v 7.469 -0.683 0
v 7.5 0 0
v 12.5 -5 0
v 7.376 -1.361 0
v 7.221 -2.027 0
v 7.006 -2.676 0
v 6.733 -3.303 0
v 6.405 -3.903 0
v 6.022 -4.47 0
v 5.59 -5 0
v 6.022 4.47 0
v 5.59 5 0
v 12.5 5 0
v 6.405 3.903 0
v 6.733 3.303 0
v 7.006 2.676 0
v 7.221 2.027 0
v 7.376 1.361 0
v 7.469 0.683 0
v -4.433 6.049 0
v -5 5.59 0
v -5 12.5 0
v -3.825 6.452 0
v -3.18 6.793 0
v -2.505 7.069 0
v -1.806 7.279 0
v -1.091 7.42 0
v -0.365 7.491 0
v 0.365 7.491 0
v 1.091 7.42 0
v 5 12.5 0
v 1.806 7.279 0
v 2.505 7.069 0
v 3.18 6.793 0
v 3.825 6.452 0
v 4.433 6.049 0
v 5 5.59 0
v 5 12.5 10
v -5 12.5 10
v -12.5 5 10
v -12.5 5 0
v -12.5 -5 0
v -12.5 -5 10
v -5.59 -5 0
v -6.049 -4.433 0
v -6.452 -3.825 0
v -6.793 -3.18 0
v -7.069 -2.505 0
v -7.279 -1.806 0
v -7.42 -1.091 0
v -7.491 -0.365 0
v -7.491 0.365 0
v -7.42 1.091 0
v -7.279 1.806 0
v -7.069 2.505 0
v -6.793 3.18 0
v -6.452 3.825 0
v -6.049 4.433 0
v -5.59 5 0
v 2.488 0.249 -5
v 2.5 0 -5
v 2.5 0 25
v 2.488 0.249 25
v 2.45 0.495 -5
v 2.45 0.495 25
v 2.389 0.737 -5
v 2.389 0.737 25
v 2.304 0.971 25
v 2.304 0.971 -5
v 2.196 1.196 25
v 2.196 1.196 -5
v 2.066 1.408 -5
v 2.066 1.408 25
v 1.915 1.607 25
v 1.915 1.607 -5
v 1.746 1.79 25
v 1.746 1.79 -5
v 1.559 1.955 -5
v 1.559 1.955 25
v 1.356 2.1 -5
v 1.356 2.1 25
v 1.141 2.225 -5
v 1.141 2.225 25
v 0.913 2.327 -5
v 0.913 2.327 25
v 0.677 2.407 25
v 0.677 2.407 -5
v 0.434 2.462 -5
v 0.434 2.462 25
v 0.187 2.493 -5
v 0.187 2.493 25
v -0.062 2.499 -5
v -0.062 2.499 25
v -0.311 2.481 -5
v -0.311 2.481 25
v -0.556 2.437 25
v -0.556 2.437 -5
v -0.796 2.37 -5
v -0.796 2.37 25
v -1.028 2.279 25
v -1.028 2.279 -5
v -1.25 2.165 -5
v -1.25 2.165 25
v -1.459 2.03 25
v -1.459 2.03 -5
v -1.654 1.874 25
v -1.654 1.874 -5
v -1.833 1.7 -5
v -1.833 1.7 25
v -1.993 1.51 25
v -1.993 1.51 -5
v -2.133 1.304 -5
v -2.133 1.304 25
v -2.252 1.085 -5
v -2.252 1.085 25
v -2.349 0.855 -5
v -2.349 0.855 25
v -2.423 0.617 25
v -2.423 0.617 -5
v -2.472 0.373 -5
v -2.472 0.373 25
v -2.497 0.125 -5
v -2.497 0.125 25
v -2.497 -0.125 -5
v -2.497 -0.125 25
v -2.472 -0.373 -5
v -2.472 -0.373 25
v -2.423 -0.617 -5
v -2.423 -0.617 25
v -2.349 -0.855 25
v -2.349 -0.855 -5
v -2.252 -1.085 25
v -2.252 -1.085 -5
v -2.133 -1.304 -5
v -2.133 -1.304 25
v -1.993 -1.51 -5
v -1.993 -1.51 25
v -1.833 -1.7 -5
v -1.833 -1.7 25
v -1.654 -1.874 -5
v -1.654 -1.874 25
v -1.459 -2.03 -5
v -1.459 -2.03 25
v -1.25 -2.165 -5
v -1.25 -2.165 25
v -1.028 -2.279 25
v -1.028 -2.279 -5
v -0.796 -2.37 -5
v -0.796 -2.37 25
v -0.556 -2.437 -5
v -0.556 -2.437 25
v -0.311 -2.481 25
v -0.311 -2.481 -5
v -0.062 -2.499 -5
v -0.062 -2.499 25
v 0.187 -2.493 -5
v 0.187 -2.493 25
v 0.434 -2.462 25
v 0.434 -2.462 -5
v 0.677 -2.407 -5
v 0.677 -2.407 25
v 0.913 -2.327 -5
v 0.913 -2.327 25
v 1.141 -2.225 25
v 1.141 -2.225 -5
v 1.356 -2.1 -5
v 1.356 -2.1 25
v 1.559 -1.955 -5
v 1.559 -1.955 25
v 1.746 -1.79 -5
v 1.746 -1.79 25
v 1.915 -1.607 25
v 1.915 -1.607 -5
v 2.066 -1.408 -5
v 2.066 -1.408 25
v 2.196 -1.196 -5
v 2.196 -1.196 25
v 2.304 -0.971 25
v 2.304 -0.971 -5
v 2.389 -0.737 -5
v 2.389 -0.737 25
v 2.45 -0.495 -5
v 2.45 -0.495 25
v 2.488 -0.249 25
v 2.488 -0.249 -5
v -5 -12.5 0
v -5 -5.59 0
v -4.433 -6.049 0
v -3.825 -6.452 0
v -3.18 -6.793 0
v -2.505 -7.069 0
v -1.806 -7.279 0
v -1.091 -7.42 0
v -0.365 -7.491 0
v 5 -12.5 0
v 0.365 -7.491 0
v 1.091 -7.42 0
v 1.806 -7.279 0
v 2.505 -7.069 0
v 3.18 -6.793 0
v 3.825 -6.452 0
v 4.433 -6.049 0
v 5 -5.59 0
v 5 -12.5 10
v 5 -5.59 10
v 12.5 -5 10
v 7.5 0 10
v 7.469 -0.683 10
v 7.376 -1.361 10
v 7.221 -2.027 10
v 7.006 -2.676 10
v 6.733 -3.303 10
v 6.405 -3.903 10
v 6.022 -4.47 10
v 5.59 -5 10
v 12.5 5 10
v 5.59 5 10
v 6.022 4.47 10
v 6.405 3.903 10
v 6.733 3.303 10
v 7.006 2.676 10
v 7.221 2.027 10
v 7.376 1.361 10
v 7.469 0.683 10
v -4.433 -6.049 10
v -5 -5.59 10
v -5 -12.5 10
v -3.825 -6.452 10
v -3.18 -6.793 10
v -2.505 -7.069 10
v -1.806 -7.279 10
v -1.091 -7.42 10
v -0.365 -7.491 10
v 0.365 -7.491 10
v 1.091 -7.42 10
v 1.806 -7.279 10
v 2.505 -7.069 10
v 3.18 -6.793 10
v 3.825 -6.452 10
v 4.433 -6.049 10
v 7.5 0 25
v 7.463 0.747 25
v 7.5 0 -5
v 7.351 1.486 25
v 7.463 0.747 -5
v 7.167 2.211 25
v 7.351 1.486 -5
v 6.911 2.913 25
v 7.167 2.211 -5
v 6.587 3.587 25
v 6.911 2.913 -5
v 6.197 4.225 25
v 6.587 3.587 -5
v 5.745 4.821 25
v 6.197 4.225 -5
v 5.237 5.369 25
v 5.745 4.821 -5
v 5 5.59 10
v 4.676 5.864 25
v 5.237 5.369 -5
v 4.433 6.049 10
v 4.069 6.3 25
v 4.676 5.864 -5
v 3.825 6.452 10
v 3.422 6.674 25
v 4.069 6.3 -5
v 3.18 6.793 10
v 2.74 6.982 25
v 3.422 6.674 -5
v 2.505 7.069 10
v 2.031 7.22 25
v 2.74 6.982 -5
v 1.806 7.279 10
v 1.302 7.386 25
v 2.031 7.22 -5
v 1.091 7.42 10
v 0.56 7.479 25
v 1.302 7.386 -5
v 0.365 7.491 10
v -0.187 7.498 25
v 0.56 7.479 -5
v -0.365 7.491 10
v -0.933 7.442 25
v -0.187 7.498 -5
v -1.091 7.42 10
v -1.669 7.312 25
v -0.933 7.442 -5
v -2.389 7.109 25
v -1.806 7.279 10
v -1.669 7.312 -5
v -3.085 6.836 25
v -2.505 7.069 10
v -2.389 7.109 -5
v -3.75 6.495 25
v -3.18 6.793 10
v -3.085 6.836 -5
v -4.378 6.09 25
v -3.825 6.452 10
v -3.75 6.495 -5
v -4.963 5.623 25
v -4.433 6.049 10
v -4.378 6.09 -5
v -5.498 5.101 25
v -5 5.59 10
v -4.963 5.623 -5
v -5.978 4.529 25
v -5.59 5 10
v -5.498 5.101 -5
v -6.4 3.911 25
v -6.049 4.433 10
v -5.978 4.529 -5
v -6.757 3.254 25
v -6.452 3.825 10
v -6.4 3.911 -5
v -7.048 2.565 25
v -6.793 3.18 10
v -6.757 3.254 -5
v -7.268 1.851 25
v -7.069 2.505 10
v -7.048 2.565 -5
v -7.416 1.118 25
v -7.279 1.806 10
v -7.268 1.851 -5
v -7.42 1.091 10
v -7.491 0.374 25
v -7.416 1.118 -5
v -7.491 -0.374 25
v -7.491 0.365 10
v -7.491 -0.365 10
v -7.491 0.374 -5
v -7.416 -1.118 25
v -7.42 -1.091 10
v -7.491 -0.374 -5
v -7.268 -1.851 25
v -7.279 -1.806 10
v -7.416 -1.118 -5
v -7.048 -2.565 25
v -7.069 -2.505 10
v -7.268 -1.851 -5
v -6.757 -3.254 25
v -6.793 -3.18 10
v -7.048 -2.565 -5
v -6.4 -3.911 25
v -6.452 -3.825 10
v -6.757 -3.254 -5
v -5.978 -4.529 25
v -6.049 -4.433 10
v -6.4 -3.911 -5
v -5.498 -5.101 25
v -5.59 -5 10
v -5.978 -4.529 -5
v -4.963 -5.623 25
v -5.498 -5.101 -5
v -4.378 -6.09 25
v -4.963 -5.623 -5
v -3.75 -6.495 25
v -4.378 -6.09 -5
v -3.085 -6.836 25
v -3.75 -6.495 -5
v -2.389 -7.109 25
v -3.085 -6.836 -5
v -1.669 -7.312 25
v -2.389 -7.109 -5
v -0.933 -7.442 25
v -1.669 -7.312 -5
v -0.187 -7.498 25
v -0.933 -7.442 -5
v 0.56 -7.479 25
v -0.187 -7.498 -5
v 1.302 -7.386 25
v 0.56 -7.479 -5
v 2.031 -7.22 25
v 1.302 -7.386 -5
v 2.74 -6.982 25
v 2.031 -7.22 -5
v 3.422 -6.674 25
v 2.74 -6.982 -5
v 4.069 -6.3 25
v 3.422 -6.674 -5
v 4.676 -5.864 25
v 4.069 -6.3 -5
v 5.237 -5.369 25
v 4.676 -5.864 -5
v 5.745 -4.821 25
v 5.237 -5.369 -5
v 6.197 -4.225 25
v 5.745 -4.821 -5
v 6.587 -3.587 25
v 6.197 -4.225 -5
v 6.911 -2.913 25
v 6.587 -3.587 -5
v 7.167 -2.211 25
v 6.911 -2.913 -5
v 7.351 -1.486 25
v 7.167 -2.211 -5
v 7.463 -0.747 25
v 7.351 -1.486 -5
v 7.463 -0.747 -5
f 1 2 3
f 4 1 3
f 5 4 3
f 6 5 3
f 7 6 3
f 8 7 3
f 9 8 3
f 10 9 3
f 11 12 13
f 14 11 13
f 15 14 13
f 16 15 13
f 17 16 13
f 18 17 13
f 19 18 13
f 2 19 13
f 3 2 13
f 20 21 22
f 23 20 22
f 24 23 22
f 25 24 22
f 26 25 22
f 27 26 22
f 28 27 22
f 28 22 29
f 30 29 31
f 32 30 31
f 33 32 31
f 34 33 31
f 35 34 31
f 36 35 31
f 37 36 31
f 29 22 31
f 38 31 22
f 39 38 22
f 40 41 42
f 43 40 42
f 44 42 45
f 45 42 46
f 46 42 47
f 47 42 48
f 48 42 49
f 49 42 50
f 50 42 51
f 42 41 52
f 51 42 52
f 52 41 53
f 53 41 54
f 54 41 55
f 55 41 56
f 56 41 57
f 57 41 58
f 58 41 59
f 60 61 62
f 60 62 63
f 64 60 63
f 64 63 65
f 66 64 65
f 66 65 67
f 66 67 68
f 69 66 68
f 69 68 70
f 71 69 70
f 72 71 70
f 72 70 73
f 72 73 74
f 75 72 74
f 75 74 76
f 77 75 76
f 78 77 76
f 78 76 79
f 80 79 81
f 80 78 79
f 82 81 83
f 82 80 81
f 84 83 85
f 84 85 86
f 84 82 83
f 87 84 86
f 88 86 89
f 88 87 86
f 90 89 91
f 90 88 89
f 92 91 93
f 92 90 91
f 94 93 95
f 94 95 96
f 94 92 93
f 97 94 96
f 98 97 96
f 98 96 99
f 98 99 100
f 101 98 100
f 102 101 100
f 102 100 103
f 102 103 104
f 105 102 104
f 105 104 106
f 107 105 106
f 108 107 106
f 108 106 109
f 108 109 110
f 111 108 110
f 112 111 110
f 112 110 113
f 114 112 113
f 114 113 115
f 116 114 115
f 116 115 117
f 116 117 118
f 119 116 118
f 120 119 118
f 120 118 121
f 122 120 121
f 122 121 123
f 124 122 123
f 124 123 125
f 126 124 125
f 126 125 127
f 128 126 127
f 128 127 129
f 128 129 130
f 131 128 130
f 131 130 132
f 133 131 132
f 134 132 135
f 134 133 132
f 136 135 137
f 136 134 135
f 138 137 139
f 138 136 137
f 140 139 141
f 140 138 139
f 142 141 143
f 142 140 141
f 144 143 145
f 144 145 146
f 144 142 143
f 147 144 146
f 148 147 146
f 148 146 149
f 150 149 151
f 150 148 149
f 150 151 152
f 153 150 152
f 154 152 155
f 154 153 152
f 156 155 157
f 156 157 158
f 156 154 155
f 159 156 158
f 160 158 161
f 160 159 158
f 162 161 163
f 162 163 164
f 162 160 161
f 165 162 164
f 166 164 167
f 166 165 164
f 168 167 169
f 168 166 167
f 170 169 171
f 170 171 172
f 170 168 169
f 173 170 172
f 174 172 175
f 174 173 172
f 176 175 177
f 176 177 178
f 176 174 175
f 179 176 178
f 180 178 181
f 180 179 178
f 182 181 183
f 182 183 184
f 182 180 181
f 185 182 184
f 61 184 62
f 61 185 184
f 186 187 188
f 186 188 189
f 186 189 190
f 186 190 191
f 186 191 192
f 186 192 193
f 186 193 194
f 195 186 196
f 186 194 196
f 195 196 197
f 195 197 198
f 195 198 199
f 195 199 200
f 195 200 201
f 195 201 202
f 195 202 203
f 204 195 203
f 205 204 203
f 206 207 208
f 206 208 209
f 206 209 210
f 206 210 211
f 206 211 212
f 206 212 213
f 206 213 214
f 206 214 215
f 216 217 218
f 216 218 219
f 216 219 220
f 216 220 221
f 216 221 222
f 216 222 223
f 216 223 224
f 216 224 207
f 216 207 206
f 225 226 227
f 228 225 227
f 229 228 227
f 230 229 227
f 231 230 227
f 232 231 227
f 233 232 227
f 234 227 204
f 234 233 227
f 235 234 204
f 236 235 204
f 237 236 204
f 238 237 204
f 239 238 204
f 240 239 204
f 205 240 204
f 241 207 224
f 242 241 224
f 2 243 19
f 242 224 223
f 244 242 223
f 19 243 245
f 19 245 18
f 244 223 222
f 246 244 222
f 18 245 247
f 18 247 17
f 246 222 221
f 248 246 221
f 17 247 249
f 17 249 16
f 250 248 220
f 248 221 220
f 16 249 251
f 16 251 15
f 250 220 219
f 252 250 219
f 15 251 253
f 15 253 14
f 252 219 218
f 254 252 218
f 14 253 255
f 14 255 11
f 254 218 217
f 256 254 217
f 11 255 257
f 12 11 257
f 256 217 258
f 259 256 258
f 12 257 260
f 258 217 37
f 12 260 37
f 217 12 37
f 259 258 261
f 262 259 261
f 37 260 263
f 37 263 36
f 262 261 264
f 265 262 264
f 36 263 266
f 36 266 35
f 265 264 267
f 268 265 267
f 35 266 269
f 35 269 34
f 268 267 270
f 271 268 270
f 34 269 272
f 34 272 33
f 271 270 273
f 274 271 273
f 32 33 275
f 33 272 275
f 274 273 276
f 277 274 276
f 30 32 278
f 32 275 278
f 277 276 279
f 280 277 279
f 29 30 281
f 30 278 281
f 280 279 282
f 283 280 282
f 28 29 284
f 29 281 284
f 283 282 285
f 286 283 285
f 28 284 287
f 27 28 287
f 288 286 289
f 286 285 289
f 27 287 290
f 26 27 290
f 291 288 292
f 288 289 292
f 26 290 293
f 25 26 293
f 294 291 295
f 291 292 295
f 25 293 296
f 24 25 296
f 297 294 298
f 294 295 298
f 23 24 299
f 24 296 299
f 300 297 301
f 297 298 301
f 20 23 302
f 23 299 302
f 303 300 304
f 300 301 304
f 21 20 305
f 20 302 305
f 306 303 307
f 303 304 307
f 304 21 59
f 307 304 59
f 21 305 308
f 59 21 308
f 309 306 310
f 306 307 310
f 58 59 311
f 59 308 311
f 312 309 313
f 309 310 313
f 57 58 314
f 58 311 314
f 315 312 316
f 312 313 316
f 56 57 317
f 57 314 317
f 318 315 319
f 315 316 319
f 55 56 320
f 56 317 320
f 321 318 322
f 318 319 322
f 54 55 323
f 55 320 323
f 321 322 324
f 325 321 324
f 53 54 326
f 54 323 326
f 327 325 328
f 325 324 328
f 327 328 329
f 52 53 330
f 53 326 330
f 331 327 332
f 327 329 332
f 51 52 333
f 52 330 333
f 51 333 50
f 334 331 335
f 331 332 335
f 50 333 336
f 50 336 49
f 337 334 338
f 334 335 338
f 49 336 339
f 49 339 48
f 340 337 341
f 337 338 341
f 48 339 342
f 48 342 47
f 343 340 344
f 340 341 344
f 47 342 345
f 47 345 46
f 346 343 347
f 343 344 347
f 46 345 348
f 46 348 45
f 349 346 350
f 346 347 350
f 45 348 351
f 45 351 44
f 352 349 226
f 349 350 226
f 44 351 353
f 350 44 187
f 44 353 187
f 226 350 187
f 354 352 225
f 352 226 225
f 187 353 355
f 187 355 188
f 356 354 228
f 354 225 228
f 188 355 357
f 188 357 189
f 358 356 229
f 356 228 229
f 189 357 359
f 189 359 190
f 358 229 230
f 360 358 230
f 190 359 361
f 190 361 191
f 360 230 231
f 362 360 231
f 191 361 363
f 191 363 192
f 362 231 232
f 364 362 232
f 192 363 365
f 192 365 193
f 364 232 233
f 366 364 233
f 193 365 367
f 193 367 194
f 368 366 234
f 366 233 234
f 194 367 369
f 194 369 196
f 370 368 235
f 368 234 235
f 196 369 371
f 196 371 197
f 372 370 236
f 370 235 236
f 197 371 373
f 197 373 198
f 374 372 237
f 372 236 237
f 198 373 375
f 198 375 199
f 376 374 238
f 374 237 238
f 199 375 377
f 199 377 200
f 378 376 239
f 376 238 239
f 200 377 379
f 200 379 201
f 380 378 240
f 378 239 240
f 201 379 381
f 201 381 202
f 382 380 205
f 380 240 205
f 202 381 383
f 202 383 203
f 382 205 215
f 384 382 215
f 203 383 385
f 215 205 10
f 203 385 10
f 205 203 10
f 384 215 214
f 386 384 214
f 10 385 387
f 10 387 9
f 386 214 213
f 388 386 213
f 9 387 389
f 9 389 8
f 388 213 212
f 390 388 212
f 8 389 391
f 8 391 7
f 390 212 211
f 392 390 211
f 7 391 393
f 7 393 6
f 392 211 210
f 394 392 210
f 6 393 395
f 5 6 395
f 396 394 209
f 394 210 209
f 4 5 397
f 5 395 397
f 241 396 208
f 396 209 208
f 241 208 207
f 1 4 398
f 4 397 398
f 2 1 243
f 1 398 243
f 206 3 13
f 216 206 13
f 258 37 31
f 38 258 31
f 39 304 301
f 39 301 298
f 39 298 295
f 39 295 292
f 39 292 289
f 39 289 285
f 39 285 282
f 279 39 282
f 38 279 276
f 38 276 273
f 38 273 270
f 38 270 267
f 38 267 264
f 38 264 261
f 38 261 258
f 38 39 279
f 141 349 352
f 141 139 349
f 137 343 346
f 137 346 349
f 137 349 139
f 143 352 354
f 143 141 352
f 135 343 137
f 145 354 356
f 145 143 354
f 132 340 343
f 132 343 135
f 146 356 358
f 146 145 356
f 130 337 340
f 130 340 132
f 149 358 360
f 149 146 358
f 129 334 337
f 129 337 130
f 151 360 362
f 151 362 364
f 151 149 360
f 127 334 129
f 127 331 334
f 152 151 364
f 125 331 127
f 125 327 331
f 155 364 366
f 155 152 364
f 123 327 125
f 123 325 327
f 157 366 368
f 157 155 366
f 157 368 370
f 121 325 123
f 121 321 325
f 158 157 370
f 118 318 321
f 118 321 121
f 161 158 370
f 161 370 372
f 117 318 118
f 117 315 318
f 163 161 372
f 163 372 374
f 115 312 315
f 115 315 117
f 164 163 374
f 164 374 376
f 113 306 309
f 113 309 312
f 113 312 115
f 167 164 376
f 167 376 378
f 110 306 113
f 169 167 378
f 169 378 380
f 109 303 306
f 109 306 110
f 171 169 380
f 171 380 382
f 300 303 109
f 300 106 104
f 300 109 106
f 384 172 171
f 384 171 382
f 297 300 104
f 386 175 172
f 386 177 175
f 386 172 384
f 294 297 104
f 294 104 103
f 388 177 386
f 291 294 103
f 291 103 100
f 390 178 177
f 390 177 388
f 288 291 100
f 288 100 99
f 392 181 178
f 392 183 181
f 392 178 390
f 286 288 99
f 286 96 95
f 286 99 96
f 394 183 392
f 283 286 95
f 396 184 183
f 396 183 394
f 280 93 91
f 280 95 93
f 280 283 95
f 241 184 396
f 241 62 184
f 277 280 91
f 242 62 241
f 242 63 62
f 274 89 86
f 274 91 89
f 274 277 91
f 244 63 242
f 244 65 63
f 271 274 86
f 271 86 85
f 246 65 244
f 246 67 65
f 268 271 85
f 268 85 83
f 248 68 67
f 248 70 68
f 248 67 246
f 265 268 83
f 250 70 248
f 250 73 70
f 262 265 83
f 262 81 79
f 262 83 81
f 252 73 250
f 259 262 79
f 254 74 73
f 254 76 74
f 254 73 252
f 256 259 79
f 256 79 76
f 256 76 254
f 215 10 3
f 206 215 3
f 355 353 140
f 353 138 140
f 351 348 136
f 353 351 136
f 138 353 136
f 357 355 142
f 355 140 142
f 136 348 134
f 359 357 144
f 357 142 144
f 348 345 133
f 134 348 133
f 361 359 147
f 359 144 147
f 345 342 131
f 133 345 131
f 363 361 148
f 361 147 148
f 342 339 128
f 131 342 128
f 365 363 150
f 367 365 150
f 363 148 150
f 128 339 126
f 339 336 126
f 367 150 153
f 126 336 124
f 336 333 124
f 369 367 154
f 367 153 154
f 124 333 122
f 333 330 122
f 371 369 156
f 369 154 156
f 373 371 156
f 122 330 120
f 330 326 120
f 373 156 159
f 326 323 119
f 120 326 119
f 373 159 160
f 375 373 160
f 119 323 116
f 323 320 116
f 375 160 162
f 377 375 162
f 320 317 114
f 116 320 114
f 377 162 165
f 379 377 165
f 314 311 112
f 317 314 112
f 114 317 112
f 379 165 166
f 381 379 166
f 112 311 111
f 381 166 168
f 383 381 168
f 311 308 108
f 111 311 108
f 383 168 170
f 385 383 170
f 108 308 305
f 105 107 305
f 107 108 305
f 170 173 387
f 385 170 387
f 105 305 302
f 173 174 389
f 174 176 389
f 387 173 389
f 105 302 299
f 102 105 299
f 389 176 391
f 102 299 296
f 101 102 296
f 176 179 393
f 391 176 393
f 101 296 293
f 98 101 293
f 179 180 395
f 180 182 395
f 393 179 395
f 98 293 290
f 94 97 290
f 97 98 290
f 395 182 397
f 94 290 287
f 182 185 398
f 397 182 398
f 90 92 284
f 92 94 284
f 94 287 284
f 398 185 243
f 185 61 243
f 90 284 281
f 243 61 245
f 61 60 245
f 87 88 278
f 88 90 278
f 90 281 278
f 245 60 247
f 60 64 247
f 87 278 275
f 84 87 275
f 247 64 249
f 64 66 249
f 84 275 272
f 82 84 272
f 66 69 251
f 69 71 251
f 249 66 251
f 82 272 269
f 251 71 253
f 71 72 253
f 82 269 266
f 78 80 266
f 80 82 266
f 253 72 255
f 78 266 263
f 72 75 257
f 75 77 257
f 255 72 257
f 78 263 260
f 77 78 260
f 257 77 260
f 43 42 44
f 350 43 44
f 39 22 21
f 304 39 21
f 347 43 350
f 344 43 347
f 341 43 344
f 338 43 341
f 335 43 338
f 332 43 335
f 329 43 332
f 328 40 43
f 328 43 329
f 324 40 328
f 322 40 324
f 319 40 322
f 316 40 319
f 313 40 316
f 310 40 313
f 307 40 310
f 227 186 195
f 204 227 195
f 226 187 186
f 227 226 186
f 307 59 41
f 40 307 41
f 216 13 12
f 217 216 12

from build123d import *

# Parameters (mm, degrees)
SKETCH1_R                = 7.5
SKETCH1_R_2              = 2.5
BOSS_EXTRUDE1_DEPTH      = 10
BOSS_EXTRUDE2_DEPTH      = 15
BOSS_EXTRUDE2_DEPTH_BACK = 15
SKETCH2_R                = 7.5
SKETCH2_R_2              = 2.5


with BuildPart() as part:
    # Sketch1 → Boss-Extrude1 (new body)
    # profile 1 of 5: a face of its own
    with BuildSketch(Plane.XY):
        with BuildLine():
            Line((-12.5, -5), (-5.590169944, -5))
            ThreePointArc((-5.590169944, -5), (-7.5, 0), (-5.590169944, 5))
            Line((-5.590169944, 5), (-12.5, 5))
            Line((-12.5, 5), (-12.5, -5))
        make_face()
    # profile 2 of 5: a face of its own
    with BuildSketch(Plane.XY):
        with BuildLine():
            ThreePointArc((5, -5.590169944), (0, -7.5), (-5, -5.590169944))
            Line((-5, -5.590169944), (-5, -12.5))
            Line((-5, -12.5), (5, -12.5))
            Line((5, -12.5), (5, -5.590169944))
        make_face()
    # profile 3 of 5: a face of its own
    with BuildSketch(Plane.XY):
        with BuildLine():
            Line((-5, 12.5), (-5, 5.590169944))
            ThreePointArc((-5, 5.590169944), (0, 7.5), (5, 5.590169944))
            Line((5, 5.590169944), (5, 12.5))
            Line((5, 12.5), (-5, 12.5))
        make_face()
    # profile 4 of 5: a face of its own
    with BuildSketch(Plane.XY):
        with BuildLine():
            ThreePointArc((7.5, 0), (7.006292692, -2.676165673), (5.590169944, -5))
            Line((5.590169944, -5), (12.5, -5))
            Line((12.5, -5), (12.5, 5))
            Line((12.5, 5), (5.590169944, 5))
            ThreePointArc((5.590169944, 5), (7.006292692, 2.676165673), (7.5, 0))
        make_face()
    # profile 5 of 5: a face of its own
    with BuildSketch(Plane.XY):
        Circle(SKETCH1_R)
        Circle(SKETCH1_R_2, mode=Mode.SUBTRACT)
    extrude(amount=BOSS_EXTRUDE1_DEPTH)

    # Sketch2 → Boss-Extrude2 (add, two sides: drawn at the far end of the back side and taken through both)
    with BuildSketch(Plane.XY.offset(10).offset(-BOSS_EXTRUDE2_DEPTH_BACK)):
        Circle(SKETCH2_R)
        Circle(SKETCH2_R_2, mode=Mode.SUBTRACT)
    extrude(amount=BOSS_EXTRUDE2_DEPTH + BOSS_EXTRUDE2_DEPTH_BACK)


solid = part.part
